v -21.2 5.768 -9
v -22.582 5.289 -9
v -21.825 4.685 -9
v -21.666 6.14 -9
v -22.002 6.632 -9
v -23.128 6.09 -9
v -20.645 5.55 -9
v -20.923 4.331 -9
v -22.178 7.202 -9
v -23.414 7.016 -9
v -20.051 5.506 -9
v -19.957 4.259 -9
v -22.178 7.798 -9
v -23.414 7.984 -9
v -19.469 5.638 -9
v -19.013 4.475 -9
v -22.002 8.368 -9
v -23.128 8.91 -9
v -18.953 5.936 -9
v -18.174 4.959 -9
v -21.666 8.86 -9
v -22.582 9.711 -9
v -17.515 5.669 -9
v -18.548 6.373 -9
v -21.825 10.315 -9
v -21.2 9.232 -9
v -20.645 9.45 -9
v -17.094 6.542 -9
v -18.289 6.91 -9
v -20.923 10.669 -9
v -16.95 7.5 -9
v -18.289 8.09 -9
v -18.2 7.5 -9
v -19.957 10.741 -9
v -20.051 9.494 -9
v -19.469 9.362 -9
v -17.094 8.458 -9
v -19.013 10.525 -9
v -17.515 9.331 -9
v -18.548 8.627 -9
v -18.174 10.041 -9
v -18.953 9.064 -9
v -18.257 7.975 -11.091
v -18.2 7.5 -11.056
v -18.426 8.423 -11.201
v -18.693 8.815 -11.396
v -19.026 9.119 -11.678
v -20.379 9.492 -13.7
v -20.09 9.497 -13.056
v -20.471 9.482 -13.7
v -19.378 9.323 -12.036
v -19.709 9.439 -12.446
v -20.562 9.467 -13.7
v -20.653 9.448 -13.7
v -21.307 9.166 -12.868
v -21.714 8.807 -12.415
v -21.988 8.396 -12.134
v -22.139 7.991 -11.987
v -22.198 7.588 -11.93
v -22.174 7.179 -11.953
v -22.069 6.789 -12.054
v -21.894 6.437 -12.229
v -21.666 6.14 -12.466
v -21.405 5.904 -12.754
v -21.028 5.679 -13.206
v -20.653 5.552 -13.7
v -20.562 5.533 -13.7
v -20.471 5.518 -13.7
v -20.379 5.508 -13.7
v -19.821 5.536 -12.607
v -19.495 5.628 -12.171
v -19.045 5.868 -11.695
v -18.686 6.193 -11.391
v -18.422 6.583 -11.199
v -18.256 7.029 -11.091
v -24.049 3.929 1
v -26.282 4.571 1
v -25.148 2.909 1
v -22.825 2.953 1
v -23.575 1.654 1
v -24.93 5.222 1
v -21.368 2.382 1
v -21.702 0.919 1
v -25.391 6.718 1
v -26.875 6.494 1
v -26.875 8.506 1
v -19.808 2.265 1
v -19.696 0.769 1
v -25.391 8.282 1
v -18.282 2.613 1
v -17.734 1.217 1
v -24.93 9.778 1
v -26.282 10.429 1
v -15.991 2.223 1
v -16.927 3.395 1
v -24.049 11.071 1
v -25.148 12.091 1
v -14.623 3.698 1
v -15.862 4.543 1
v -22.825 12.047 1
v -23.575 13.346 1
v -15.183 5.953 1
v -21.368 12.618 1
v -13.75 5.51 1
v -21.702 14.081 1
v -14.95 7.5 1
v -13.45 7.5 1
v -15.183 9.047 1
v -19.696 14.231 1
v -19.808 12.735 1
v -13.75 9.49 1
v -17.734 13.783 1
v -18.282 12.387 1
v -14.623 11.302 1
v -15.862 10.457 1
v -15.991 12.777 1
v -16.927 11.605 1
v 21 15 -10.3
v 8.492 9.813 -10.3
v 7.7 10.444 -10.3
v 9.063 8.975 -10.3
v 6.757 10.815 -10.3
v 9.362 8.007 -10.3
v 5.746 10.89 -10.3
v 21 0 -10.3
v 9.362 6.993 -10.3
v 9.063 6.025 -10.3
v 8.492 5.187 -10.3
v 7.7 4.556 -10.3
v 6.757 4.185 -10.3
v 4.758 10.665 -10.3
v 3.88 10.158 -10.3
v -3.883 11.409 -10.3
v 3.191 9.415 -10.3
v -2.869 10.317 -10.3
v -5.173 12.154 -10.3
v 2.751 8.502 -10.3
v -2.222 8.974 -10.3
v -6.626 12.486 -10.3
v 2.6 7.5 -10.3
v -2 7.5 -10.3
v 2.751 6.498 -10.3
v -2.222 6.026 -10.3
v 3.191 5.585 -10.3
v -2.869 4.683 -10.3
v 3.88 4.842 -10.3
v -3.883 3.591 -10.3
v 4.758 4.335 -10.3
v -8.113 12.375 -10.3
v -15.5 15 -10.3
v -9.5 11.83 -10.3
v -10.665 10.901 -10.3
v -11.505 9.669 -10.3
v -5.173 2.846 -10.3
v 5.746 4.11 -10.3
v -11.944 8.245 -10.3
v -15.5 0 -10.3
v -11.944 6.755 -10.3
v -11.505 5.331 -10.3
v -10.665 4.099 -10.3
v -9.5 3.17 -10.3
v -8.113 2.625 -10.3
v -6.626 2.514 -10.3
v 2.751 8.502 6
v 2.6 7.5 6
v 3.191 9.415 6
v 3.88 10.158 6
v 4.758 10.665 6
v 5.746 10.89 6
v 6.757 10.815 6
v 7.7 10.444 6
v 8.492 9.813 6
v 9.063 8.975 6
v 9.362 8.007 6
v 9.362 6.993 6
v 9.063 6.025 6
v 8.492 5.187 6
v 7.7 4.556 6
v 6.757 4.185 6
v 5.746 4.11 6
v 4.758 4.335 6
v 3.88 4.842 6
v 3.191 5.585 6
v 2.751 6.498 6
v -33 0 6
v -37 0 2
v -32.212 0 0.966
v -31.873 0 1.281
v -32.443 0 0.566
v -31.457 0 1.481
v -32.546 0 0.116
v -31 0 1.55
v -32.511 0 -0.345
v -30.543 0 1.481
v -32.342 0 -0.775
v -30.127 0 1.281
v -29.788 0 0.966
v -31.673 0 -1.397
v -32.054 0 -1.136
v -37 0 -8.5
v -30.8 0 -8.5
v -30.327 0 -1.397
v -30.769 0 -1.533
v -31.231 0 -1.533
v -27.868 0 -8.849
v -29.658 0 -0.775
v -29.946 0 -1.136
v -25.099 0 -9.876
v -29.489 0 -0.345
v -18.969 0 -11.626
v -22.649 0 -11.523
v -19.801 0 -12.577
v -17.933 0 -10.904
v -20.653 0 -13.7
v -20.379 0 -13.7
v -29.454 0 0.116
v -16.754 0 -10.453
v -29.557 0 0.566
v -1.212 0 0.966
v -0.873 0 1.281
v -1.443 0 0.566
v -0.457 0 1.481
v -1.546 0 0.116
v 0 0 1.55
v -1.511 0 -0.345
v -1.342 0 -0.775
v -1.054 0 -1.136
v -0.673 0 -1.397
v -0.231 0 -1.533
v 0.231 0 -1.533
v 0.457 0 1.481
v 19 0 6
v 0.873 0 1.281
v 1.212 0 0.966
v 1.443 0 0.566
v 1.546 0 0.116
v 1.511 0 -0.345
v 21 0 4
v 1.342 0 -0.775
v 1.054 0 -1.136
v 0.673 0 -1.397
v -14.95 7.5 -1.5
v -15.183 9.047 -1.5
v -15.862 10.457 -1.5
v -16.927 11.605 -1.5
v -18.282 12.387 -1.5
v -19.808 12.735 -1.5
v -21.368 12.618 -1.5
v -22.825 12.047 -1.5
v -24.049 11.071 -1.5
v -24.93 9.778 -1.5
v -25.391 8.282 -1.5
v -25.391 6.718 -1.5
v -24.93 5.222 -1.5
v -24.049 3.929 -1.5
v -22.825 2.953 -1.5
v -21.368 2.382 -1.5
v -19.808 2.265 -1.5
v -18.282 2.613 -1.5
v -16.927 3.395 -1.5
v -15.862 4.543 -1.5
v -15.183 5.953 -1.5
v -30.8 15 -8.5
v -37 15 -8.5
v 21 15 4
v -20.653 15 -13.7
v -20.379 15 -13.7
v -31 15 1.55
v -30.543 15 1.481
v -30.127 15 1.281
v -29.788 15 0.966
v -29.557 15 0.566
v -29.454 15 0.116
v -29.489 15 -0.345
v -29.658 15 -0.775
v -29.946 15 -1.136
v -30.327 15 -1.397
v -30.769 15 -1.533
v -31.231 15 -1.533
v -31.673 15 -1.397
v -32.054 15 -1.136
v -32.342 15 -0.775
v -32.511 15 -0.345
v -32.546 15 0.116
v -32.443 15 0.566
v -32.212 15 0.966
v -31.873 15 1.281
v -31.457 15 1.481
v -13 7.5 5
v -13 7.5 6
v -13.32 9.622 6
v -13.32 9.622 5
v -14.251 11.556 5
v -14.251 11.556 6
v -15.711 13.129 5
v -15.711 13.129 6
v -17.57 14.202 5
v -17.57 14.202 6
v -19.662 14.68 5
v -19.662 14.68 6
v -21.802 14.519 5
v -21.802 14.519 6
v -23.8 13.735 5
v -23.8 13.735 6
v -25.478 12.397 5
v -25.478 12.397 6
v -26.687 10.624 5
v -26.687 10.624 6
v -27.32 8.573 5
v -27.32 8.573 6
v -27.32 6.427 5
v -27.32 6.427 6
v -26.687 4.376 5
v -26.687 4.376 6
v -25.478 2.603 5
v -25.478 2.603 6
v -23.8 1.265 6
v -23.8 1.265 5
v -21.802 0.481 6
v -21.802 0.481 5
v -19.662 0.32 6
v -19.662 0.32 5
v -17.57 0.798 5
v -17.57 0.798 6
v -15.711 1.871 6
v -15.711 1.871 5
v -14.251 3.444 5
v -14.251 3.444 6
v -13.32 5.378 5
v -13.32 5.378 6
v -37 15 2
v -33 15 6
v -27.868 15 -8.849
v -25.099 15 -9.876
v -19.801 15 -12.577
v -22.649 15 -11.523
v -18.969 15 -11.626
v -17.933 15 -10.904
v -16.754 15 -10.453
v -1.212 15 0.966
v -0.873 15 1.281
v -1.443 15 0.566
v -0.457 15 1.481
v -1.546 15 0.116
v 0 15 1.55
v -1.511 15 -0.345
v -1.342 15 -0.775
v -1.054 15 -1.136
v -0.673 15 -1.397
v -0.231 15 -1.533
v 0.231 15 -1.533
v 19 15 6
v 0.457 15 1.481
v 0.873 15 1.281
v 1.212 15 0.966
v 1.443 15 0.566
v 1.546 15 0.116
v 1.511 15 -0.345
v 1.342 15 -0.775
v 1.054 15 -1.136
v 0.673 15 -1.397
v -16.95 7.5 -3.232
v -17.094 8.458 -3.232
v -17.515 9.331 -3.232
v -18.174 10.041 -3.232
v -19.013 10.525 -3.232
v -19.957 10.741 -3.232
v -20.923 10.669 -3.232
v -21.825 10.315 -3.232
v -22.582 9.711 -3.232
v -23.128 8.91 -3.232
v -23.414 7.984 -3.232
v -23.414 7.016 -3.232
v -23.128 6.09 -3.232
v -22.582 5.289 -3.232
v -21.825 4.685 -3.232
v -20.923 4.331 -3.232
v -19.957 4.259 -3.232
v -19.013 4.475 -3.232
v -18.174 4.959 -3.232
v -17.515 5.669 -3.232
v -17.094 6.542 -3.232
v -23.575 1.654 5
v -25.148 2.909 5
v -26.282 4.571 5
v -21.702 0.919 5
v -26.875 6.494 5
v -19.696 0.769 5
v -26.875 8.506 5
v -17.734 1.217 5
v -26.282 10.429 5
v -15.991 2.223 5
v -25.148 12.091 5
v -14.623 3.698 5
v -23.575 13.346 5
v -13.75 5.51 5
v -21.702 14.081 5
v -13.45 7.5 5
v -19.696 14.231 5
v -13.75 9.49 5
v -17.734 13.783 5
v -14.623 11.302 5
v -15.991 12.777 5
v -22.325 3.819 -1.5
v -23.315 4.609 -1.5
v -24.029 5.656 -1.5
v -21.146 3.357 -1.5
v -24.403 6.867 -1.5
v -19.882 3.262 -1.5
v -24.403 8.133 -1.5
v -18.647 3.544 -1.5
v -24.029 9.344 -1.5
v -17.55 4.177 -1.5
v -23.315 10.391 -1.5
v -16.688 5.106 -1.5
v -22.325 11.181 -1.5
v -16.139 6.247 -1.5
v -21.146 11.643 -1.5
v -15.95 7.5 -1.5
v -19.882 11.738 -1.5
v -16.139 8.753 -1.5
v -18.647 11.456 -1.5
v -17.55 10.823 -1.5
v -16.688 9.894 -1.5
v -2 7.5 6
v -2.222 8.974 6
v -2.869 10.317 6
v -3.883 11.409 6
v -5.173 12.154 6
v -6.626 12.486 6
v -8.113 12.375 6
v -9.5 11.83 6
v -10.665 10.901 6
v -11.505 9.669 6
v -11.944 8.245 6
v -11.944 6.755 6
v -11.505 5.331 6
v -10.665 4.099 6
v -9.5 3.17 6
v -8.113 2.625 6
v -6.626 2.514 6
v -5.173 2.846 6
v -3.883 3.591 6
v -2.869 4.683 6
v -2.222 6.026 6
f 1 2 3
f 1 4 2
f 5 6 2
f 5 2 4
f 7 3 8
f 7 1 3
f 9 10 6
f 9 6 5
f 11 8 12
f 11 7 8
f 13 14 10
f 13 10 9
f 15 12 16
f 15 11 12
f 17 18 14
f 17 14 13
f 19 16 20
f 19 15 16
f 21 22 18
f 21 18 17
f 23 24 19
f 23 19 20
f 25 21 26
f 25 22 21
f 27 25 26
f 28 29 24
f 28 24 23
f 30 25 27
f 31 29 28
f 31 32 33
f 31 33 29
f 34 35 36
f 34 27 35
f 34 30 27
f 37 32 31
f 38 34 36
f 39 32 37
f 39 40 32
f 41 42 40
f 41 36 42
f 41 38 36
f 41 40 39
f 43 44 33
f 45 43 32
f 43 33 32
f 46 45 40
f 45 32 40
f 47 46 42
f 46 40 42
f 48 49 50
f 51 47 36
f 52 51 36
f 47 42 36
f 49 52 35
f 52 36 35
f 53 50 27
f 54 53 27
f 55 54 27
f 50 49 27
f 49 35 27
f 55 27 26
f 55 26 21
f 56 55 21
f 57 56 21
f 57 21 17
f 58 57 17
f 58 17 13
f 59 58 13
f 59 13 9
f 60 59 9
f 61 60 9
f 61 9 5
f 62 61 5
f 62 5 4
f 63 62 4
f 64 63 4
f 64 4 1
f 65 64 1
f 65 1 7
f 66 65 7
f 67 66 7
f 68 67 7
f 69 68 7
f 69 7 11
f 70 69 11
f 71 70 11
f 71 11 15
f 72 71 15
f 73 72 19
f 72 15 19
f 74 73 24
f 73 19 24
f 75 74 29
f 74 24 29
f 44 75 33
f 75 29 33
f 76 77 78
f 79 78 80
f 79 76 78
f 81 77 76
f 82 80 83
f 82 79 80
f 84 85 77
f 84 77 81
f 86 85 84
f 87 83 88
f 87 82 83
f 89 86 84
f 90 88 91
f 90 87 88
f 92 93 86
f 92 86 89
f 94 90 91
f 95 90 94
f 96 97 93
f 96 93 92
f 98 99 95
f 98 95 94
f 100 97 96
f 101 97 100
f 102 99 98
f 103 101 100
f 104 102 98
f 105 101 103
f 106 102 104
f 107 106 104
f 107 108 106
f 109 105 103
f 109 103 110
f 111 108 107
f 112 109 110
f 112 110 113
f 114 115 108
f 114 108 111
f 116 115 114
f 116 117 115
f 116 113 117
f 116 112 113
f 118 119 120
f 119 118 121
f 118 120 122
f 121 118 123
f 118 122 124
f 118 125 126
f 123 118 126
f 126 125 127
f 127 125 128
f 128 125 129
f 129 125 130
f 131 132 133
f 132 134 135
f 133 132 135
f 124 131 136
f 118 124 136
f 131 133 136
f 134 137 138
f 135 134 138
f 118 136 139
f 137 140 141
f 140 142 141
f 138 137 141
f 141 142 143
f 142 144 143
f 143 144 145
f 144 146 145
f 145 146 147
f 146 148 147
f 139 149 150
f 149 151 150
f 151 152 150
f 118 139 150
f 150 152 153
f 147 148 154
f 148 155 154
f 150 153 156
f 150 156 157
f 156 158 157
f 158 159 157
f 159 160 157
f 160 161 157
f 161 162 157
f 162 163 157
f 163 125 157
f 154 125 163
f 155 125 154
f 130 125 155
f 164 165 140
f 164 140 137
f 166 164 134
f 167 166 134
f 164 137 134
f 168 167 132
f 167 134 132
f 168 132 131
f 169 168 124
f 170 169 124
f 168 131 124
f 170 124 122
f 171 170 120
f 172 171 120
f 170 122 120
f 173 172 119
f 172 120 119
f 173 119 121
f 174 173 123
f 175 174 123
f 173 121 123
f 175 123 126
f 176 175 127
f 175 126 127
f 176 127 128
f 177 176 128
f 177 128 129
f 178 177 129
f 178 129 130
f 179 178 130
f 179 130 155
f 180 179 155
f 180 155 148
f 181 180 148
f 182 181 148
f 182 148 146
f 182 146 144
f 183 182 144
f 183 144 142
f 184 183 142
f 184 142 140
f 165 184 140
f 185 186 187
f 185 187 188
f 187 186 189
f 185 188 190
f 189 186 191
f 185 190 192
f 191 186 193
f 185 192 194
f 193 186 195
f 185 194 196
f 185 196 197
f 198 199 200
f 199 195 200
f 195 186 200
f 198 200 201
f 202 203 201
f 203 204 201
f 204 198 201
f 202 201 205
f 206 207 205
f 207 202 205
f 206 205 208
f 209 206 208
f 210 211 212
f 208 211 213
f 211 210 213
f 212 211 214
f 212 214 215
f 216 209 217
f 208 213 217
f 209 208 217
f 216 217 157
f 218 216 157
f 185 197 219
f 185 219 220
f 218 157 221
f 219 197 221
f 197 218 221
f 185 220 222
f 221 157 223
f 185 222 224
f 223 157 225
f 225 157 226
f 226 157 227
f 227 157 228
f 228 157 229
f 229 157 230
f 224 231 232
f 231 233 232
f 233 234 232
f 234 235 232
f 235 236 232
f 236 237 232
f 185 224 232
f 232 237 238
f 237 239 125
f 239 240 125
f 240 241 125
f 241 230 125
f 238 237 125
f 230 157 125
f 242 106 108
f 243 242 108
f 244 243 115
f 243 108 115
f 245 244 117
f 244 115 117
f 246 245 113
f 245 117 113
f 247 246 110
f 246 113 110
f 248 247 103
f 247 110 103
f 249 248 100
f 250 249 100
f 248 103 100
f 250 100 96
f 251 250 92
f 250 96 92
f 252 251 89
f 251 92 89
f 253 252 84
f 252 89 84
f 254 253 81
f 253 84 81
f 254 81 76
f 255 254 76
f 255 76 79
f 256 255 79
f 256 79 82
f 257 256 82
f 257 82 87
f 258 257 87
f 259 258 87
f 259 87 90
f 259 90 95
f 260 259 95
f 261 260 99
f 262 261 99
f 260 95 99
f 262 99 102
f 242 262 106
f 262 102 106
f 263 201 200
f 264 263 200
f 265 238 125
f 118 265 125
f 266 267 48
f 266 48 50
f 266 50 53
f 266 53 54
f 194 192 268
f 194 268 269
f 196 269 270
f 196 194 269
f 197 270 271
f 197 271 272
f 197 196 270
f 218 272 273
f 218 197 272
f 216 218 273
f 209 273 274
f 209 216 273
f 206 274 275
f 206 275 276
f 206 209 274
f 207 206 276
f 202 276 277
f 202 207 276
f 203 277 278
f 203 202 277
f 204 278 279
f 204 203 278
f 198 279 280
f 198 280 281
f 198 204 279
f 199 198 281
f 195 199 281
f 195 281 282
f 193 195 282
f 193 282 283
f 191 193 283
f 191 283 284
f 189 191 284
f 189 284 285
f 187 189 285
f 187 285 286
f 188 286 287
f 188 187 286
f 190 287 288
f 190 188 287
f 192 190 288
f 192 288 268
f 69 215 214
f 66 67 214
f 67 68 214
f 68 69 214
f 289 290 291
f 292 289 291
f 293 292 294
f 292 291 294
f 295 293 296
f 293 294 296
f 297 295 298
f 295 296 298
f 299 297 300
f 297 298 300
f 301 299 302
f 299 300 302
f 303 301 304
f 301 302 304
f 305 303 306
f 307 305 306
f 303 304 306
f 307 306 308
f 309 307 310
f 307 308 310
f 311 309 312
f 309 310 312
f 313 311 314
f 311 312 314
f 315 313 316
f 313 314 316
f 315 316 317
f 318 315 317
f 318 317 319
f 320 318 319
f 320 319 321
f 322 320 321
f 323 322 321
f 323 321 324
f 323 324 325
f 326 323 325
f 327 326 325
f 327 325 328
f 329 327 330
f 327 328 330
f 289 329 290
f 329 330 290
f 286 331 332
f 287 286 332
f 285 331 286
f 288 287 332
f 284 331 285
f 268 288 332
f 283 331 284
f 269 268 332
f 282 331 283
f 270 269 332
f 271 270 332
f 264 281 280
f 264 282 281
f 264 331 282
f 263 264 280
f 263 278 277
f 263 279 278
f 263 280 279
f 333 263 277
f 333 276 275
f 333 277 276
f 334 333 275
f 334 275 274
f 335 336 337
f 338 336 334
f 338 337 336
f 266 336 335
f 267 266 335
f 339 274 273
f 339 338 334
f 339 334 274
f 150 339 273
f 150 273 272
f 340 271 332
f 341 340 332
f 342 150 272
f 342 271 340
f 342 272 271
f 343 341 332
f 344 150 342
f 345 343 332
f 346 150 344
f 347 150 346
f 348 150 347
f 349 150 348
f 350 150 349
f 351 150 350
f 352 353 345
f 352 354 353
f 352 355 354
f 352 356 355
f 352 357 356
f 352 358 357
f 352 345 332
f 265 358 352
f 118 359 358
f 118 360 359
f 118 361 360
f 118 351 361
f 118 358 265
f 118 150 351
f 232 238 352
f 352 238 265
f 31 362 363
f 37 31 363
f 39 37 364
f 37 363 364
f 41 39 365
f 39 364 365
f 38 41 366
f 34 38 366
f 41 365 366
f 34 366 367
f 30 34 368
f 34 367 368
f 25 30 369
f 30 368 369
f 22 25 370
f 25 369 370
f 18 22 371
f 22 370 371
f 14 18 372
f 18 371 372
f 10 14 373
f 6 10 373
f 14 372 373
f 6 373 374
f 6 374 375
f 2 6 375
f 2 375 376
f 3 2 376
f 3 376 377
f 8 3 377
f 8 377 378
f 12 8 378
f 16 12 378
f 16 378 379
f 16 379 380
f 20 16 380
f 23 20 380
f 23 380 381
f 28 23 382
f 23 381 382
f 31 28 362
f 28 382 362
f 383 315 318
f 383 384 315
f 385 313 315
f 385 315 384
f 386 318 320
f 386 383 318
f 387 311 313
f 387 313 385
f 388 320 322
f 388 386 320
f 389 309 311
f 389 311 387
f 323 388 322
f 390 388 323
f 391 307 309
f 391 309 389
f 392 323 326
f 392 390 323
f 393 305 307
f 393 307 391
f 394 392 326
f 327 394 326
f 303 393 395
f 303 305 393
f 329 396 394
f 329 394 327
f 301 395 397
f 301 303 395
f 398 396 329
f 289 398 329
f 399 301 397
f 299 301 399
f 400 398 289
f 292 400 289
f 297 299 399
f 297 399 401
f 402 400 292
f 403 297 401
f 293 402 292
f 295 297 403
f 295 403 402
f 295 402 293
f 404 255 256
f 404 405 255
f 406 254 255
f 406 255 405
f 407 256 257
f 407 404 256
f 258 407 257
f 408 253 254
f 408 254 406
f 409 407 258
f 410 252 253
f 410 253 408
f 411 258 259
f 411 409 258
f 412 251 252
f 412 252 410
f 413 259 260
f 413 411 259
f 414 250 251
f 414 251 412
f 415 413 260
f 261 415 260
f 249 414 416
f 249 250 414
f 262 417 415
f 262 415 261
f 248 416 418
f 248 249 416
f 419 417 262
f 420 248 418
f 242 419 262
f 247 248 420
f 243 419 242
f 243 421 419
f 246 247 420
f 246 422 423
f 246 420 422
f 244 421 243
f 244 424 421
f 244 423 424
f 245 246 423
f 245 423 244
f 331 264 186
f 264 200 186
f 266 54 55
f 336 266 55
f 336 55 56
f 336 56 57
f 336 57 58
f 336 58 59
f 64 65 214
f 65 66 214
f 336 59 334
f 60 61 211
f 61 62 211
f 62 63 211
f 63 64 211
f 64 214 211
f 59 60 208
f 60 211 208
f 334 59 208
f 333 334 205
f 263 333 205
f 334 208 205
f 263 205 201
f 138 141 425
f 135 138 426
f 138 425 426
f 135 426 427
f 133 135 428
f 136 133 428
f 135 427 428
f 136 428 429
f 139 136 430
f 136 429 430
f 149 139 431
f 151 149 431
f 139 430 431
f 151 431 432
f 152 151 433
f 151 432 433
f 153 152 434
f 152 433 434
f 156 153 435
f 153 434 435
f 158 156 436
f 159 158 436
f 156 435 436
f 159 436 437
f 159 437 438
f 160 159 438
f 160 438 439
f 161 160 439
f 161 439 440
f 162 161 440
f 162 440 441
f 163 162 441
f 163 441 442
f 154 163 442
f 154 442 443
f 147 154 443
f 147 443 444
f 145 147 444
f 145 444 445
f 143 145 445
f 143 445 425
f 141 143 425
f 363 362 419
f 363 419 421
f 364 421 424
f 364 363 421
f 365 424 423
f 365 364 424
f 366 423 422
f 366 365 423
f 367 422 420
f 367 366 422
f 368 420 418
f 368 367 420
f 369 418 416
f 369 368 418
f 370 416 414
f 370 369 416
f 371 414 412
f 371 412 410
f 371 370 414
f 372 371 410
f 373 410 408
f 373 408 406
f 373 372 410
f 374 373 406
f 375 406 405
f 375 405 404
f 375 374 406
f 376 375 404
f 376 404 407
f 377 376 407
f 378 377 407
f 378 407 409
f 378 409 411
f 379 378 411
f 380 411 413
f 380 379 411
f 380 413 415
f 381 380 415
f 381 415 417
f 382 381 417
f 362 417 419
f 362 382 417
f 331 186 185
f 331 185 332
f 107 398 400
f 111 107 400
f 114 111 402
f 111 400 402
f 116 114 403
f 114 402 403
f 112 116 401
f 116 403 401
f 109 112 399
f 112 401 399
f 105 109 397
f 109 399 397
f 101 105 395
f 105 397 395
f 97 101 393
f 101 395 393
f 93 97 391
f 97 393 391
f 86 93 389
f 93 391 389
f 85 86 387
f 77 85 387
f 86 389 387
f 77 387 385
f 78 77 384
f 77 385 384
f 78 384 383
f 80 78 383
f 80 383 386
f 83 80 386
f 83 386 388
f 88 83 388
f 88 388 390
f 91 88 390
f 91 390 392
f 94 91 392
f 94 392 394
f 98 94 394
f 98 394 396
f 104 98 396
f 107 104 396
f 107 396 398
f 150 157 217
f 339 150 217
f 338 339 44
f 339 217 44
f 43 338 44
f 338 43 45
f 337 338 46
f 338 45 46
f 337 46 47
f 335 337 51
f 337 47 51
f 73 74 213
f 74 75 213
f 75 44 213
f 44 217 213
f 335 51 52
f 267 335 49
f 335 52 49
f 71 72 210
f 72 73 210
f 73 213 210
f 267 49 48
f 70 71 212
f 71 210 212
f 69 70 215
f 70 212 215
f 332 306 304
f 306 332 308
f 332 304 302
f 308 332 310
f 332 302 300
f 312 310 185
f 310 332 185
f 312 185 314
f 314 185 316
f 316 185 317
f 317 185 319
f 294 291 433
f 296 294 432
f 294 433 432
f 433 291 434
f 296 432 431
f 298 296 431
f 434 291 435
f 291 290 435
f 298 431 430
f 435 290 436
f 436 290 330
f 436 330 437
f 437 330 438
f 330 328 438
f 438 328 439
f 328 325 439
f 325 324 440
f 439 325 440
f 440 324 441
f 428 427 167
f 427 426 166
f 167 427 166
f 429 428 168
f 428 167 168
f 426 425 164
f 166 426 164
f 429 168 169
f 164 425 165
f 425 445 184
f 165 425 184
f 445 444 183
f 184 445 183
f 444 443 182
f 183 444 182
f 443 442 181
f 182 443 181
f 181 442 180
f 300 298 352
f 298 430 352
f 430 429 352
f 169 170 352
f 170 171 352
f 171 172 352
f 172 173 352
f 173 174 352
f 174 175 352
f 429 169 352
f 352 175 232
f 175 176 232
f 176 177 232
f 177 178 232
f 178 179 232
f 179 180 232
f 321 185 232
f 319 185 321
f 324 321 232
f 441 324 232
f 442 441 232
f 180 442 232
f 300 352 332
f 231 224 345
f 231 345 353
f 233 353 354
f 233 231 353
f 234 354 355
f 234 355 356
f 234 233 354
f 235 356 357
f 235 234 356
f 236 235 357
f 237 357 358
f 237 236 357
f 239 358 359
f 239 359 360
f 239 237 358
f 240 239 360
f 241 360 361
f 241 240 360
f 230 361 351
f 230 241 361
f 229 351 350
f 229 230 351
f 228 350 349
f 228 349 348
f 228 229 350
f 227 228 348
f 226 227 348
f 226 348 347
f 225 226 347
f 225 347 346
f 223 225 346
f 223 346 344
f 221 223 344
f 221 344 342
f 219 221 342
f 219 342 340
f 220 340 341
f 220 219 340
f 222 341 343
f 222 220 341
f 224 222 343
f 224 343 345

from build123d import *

# Parameters (mm, degrees)
CROQUIS1_W              = 58
CROQUIS1_H              = 12.5
CROQUIS1_R              = 1.55
SALIENTE_EXTRUIR1_DEPTH = 15
SALIENTE_EXTRUIR2_DEPTH = 15
CROQUIS2_R              = 2
CORTAR_EXTRUIR1_DEPTH   = 45.520669357
CROQUIS24_R             = 6.75
CORTAR_EXTRUIR10_DEPTH  = 5
CROQUIS25_R             = 5.25
CORTAR_EXTRUIR11_DEPTH  = 2.5
CROQUIS26_R             = 3.25
CORTAR_EXTRUIR12_DEPTH  = 7.5
TALADRO_ROSCADO_M81_D   = 6.8
CHAFL_N1_SIZE           = 4
CHAFL_N2_SIZE           = 2
CROQUIS34_R             = 5
CORTAR_EXTRUIR13_DEPTH  = 45.520669435
CHAFL_N3_SIZE           = 1
CHAFL_N3_SIZE2          = 1.732050808
CROQUIS35_R             = 7.2
CORTAR_EXTRUIR14_DEPTH  = 1


with BuildPart() as part:
    # Croquis1 → Saliente-Extruir1 (new body)
    with BuildSketch(Plane(origin=(0, 0, 0), x_dir=(1, 0, 0), z_dir=(0, 1, 0))):
        with Locations((-8, 0.25)):
            Rectangle(CROQUIS1_W, CROQUIS1_H)
        with Locations(Location((0, 0, 0), (0, 0, 270))):
            Circle(CROQUIS1_R, mode=Mode.SUBTRACT)
        with Locations(Location((-31, 0, 0), (0, 0, 270))):
            Circle(CROQUIS1_R, mode=Mode.SUBTRACT)
    extrude(amount=SALIENTE_EXTRUIR1_DEPTH)

    # Croquis5 → Saliente-Extruir2 (add)
    with BuildSketch(Plane(origin=(0, 0, 0), x_dir=(1, 0, 0), z_dir=(0, 1, 0))):
        with BuildLine():
            Line((21, 6.5), (21, 10.3))
            Line((21, 10.3), (-15.5, 10.3))
            ThreePointArc((-15.5, 10.3), (-18.473213749, 11.233854198), (-20.378524367, 13.7))
            Line((-20.378524367, 13.7), (-20.653079285, 13.7))
            ThreePointArc((-20.653079285, 13.7), (-25.099122875, 9.875702269), (-30.8, 8.5))
            Line((-30.8, 8.5), (-37, 8.5))
            Line((-37, 8.5), (-37, 6.5))
            Line((-37, 6.5), (21, 6.5))
        make_face()
    extrude(amount=SALIENTE_EXTRUIR2_DEPTH)

    # Croquis2 → Cortar-Extruir1 (cut, through all)
    with BuildSketch(Plane.XY.offset(6)):
        with Locations((-20.2, 7.5)):
            Circle(CROQUIS2_R)
    extrude(amount=-CORTAR_EXTRUIR1_DEPTH, mode=Mode.SUBTRACT)

    # Croquis24 → Cortar-Extruir10 (cut)
    with BuildSketch(Plane.XY.offset(6)):
        with Locations((-20.2, 7.5)):
            Circle(CROQUIS24_R)
    extrude(amount=-CORTAR_EXTRUIR10_DEPTH, mode=Mode.SUBTRACT)

    # Croquis25 → Cortar-Extruir11 (cut)
    with BuildSketch(Plane.XY.offset(1)):
        with Locations((-20.2, 7.5)):
            Circle(CROQUIS25_R)
    extrude(amount=-CORTAR_EXTRUIR11_DEPTH, mode=Mode.SUBTRACT)

    # Croquis26 → Cortar-Extruir12 (cut)
    with BuildSketch(Plane.XY.offset(-1.5)):
        with Locations((-20.2, 7.5)):
            Circle(CROQUIS26_R)
    extrude(amount=-CORTAR_EXTRUIR12_DEPTH, mode=Mode.SUBTRACT)

    # Taladro roscado M81 (through all)
    with Locations(Plane.XY.offset(6)):
        with Locations((6, 7.5)):
            Hole(TALADRO_ROSCADO_M81_D / 2)

    # Chaflán1
    chafl_n1_edges = [part.edges().sort_by_distance(p)[0] for p in [
        (-37, 7.5, 6),
    ]]
    chamfer(chafl_n1_edges, length=CHAFL_N1_SIZE)

    # Chaflán2
    chafl_n2_edges = [part.edges().sort_by_distance(p)[0] for p in [
        (21, 7.5, 6),
    ]]
    chamfer(chafl_n2_edges, length=CHAFL_N2_SIZE)

    # Croquis34 → Cortar-Extruir13 (cut, through all)
    with BuildSketch(Plane.XY.offset(6)):
        with Locations((-7, 7.5)):
            Circle(CROQUIS34_R)
    extrude(amount=-CORTAR_EXTRUIR13_DEPTH, mode=Mode.SUBTRACT)

    # Chaflán3
    chafl_n3_edges = [part.edges().sort_by_distance(p)[0] for p in [
        (-23.45, 7.5, -1.5),
    ]]
    chafl_n3_side = [part.faces().sort_by_distance(p)[0] for p in [
        (-25.301507576, 7.5, -1.5),
    ]]
    chamfer(chafl_n3_edges, length=CHAFL_N3_SIZE, length2=CHAFL_N3_SIZE2, reference=chafl_n3_side[0])

    # Croquis35 → Cortar-Extruir14 (cut)
    with BuildSketch(Plane.XY.offset(6)):
        with Locations((-20.2, 7.5)):
            Circle(CROQUIS35_R)
    extrude(amount=-CORTAR_EXTRUIR14_DEPTH, mode=Mode.SUBTRACT)


solid = part.part
